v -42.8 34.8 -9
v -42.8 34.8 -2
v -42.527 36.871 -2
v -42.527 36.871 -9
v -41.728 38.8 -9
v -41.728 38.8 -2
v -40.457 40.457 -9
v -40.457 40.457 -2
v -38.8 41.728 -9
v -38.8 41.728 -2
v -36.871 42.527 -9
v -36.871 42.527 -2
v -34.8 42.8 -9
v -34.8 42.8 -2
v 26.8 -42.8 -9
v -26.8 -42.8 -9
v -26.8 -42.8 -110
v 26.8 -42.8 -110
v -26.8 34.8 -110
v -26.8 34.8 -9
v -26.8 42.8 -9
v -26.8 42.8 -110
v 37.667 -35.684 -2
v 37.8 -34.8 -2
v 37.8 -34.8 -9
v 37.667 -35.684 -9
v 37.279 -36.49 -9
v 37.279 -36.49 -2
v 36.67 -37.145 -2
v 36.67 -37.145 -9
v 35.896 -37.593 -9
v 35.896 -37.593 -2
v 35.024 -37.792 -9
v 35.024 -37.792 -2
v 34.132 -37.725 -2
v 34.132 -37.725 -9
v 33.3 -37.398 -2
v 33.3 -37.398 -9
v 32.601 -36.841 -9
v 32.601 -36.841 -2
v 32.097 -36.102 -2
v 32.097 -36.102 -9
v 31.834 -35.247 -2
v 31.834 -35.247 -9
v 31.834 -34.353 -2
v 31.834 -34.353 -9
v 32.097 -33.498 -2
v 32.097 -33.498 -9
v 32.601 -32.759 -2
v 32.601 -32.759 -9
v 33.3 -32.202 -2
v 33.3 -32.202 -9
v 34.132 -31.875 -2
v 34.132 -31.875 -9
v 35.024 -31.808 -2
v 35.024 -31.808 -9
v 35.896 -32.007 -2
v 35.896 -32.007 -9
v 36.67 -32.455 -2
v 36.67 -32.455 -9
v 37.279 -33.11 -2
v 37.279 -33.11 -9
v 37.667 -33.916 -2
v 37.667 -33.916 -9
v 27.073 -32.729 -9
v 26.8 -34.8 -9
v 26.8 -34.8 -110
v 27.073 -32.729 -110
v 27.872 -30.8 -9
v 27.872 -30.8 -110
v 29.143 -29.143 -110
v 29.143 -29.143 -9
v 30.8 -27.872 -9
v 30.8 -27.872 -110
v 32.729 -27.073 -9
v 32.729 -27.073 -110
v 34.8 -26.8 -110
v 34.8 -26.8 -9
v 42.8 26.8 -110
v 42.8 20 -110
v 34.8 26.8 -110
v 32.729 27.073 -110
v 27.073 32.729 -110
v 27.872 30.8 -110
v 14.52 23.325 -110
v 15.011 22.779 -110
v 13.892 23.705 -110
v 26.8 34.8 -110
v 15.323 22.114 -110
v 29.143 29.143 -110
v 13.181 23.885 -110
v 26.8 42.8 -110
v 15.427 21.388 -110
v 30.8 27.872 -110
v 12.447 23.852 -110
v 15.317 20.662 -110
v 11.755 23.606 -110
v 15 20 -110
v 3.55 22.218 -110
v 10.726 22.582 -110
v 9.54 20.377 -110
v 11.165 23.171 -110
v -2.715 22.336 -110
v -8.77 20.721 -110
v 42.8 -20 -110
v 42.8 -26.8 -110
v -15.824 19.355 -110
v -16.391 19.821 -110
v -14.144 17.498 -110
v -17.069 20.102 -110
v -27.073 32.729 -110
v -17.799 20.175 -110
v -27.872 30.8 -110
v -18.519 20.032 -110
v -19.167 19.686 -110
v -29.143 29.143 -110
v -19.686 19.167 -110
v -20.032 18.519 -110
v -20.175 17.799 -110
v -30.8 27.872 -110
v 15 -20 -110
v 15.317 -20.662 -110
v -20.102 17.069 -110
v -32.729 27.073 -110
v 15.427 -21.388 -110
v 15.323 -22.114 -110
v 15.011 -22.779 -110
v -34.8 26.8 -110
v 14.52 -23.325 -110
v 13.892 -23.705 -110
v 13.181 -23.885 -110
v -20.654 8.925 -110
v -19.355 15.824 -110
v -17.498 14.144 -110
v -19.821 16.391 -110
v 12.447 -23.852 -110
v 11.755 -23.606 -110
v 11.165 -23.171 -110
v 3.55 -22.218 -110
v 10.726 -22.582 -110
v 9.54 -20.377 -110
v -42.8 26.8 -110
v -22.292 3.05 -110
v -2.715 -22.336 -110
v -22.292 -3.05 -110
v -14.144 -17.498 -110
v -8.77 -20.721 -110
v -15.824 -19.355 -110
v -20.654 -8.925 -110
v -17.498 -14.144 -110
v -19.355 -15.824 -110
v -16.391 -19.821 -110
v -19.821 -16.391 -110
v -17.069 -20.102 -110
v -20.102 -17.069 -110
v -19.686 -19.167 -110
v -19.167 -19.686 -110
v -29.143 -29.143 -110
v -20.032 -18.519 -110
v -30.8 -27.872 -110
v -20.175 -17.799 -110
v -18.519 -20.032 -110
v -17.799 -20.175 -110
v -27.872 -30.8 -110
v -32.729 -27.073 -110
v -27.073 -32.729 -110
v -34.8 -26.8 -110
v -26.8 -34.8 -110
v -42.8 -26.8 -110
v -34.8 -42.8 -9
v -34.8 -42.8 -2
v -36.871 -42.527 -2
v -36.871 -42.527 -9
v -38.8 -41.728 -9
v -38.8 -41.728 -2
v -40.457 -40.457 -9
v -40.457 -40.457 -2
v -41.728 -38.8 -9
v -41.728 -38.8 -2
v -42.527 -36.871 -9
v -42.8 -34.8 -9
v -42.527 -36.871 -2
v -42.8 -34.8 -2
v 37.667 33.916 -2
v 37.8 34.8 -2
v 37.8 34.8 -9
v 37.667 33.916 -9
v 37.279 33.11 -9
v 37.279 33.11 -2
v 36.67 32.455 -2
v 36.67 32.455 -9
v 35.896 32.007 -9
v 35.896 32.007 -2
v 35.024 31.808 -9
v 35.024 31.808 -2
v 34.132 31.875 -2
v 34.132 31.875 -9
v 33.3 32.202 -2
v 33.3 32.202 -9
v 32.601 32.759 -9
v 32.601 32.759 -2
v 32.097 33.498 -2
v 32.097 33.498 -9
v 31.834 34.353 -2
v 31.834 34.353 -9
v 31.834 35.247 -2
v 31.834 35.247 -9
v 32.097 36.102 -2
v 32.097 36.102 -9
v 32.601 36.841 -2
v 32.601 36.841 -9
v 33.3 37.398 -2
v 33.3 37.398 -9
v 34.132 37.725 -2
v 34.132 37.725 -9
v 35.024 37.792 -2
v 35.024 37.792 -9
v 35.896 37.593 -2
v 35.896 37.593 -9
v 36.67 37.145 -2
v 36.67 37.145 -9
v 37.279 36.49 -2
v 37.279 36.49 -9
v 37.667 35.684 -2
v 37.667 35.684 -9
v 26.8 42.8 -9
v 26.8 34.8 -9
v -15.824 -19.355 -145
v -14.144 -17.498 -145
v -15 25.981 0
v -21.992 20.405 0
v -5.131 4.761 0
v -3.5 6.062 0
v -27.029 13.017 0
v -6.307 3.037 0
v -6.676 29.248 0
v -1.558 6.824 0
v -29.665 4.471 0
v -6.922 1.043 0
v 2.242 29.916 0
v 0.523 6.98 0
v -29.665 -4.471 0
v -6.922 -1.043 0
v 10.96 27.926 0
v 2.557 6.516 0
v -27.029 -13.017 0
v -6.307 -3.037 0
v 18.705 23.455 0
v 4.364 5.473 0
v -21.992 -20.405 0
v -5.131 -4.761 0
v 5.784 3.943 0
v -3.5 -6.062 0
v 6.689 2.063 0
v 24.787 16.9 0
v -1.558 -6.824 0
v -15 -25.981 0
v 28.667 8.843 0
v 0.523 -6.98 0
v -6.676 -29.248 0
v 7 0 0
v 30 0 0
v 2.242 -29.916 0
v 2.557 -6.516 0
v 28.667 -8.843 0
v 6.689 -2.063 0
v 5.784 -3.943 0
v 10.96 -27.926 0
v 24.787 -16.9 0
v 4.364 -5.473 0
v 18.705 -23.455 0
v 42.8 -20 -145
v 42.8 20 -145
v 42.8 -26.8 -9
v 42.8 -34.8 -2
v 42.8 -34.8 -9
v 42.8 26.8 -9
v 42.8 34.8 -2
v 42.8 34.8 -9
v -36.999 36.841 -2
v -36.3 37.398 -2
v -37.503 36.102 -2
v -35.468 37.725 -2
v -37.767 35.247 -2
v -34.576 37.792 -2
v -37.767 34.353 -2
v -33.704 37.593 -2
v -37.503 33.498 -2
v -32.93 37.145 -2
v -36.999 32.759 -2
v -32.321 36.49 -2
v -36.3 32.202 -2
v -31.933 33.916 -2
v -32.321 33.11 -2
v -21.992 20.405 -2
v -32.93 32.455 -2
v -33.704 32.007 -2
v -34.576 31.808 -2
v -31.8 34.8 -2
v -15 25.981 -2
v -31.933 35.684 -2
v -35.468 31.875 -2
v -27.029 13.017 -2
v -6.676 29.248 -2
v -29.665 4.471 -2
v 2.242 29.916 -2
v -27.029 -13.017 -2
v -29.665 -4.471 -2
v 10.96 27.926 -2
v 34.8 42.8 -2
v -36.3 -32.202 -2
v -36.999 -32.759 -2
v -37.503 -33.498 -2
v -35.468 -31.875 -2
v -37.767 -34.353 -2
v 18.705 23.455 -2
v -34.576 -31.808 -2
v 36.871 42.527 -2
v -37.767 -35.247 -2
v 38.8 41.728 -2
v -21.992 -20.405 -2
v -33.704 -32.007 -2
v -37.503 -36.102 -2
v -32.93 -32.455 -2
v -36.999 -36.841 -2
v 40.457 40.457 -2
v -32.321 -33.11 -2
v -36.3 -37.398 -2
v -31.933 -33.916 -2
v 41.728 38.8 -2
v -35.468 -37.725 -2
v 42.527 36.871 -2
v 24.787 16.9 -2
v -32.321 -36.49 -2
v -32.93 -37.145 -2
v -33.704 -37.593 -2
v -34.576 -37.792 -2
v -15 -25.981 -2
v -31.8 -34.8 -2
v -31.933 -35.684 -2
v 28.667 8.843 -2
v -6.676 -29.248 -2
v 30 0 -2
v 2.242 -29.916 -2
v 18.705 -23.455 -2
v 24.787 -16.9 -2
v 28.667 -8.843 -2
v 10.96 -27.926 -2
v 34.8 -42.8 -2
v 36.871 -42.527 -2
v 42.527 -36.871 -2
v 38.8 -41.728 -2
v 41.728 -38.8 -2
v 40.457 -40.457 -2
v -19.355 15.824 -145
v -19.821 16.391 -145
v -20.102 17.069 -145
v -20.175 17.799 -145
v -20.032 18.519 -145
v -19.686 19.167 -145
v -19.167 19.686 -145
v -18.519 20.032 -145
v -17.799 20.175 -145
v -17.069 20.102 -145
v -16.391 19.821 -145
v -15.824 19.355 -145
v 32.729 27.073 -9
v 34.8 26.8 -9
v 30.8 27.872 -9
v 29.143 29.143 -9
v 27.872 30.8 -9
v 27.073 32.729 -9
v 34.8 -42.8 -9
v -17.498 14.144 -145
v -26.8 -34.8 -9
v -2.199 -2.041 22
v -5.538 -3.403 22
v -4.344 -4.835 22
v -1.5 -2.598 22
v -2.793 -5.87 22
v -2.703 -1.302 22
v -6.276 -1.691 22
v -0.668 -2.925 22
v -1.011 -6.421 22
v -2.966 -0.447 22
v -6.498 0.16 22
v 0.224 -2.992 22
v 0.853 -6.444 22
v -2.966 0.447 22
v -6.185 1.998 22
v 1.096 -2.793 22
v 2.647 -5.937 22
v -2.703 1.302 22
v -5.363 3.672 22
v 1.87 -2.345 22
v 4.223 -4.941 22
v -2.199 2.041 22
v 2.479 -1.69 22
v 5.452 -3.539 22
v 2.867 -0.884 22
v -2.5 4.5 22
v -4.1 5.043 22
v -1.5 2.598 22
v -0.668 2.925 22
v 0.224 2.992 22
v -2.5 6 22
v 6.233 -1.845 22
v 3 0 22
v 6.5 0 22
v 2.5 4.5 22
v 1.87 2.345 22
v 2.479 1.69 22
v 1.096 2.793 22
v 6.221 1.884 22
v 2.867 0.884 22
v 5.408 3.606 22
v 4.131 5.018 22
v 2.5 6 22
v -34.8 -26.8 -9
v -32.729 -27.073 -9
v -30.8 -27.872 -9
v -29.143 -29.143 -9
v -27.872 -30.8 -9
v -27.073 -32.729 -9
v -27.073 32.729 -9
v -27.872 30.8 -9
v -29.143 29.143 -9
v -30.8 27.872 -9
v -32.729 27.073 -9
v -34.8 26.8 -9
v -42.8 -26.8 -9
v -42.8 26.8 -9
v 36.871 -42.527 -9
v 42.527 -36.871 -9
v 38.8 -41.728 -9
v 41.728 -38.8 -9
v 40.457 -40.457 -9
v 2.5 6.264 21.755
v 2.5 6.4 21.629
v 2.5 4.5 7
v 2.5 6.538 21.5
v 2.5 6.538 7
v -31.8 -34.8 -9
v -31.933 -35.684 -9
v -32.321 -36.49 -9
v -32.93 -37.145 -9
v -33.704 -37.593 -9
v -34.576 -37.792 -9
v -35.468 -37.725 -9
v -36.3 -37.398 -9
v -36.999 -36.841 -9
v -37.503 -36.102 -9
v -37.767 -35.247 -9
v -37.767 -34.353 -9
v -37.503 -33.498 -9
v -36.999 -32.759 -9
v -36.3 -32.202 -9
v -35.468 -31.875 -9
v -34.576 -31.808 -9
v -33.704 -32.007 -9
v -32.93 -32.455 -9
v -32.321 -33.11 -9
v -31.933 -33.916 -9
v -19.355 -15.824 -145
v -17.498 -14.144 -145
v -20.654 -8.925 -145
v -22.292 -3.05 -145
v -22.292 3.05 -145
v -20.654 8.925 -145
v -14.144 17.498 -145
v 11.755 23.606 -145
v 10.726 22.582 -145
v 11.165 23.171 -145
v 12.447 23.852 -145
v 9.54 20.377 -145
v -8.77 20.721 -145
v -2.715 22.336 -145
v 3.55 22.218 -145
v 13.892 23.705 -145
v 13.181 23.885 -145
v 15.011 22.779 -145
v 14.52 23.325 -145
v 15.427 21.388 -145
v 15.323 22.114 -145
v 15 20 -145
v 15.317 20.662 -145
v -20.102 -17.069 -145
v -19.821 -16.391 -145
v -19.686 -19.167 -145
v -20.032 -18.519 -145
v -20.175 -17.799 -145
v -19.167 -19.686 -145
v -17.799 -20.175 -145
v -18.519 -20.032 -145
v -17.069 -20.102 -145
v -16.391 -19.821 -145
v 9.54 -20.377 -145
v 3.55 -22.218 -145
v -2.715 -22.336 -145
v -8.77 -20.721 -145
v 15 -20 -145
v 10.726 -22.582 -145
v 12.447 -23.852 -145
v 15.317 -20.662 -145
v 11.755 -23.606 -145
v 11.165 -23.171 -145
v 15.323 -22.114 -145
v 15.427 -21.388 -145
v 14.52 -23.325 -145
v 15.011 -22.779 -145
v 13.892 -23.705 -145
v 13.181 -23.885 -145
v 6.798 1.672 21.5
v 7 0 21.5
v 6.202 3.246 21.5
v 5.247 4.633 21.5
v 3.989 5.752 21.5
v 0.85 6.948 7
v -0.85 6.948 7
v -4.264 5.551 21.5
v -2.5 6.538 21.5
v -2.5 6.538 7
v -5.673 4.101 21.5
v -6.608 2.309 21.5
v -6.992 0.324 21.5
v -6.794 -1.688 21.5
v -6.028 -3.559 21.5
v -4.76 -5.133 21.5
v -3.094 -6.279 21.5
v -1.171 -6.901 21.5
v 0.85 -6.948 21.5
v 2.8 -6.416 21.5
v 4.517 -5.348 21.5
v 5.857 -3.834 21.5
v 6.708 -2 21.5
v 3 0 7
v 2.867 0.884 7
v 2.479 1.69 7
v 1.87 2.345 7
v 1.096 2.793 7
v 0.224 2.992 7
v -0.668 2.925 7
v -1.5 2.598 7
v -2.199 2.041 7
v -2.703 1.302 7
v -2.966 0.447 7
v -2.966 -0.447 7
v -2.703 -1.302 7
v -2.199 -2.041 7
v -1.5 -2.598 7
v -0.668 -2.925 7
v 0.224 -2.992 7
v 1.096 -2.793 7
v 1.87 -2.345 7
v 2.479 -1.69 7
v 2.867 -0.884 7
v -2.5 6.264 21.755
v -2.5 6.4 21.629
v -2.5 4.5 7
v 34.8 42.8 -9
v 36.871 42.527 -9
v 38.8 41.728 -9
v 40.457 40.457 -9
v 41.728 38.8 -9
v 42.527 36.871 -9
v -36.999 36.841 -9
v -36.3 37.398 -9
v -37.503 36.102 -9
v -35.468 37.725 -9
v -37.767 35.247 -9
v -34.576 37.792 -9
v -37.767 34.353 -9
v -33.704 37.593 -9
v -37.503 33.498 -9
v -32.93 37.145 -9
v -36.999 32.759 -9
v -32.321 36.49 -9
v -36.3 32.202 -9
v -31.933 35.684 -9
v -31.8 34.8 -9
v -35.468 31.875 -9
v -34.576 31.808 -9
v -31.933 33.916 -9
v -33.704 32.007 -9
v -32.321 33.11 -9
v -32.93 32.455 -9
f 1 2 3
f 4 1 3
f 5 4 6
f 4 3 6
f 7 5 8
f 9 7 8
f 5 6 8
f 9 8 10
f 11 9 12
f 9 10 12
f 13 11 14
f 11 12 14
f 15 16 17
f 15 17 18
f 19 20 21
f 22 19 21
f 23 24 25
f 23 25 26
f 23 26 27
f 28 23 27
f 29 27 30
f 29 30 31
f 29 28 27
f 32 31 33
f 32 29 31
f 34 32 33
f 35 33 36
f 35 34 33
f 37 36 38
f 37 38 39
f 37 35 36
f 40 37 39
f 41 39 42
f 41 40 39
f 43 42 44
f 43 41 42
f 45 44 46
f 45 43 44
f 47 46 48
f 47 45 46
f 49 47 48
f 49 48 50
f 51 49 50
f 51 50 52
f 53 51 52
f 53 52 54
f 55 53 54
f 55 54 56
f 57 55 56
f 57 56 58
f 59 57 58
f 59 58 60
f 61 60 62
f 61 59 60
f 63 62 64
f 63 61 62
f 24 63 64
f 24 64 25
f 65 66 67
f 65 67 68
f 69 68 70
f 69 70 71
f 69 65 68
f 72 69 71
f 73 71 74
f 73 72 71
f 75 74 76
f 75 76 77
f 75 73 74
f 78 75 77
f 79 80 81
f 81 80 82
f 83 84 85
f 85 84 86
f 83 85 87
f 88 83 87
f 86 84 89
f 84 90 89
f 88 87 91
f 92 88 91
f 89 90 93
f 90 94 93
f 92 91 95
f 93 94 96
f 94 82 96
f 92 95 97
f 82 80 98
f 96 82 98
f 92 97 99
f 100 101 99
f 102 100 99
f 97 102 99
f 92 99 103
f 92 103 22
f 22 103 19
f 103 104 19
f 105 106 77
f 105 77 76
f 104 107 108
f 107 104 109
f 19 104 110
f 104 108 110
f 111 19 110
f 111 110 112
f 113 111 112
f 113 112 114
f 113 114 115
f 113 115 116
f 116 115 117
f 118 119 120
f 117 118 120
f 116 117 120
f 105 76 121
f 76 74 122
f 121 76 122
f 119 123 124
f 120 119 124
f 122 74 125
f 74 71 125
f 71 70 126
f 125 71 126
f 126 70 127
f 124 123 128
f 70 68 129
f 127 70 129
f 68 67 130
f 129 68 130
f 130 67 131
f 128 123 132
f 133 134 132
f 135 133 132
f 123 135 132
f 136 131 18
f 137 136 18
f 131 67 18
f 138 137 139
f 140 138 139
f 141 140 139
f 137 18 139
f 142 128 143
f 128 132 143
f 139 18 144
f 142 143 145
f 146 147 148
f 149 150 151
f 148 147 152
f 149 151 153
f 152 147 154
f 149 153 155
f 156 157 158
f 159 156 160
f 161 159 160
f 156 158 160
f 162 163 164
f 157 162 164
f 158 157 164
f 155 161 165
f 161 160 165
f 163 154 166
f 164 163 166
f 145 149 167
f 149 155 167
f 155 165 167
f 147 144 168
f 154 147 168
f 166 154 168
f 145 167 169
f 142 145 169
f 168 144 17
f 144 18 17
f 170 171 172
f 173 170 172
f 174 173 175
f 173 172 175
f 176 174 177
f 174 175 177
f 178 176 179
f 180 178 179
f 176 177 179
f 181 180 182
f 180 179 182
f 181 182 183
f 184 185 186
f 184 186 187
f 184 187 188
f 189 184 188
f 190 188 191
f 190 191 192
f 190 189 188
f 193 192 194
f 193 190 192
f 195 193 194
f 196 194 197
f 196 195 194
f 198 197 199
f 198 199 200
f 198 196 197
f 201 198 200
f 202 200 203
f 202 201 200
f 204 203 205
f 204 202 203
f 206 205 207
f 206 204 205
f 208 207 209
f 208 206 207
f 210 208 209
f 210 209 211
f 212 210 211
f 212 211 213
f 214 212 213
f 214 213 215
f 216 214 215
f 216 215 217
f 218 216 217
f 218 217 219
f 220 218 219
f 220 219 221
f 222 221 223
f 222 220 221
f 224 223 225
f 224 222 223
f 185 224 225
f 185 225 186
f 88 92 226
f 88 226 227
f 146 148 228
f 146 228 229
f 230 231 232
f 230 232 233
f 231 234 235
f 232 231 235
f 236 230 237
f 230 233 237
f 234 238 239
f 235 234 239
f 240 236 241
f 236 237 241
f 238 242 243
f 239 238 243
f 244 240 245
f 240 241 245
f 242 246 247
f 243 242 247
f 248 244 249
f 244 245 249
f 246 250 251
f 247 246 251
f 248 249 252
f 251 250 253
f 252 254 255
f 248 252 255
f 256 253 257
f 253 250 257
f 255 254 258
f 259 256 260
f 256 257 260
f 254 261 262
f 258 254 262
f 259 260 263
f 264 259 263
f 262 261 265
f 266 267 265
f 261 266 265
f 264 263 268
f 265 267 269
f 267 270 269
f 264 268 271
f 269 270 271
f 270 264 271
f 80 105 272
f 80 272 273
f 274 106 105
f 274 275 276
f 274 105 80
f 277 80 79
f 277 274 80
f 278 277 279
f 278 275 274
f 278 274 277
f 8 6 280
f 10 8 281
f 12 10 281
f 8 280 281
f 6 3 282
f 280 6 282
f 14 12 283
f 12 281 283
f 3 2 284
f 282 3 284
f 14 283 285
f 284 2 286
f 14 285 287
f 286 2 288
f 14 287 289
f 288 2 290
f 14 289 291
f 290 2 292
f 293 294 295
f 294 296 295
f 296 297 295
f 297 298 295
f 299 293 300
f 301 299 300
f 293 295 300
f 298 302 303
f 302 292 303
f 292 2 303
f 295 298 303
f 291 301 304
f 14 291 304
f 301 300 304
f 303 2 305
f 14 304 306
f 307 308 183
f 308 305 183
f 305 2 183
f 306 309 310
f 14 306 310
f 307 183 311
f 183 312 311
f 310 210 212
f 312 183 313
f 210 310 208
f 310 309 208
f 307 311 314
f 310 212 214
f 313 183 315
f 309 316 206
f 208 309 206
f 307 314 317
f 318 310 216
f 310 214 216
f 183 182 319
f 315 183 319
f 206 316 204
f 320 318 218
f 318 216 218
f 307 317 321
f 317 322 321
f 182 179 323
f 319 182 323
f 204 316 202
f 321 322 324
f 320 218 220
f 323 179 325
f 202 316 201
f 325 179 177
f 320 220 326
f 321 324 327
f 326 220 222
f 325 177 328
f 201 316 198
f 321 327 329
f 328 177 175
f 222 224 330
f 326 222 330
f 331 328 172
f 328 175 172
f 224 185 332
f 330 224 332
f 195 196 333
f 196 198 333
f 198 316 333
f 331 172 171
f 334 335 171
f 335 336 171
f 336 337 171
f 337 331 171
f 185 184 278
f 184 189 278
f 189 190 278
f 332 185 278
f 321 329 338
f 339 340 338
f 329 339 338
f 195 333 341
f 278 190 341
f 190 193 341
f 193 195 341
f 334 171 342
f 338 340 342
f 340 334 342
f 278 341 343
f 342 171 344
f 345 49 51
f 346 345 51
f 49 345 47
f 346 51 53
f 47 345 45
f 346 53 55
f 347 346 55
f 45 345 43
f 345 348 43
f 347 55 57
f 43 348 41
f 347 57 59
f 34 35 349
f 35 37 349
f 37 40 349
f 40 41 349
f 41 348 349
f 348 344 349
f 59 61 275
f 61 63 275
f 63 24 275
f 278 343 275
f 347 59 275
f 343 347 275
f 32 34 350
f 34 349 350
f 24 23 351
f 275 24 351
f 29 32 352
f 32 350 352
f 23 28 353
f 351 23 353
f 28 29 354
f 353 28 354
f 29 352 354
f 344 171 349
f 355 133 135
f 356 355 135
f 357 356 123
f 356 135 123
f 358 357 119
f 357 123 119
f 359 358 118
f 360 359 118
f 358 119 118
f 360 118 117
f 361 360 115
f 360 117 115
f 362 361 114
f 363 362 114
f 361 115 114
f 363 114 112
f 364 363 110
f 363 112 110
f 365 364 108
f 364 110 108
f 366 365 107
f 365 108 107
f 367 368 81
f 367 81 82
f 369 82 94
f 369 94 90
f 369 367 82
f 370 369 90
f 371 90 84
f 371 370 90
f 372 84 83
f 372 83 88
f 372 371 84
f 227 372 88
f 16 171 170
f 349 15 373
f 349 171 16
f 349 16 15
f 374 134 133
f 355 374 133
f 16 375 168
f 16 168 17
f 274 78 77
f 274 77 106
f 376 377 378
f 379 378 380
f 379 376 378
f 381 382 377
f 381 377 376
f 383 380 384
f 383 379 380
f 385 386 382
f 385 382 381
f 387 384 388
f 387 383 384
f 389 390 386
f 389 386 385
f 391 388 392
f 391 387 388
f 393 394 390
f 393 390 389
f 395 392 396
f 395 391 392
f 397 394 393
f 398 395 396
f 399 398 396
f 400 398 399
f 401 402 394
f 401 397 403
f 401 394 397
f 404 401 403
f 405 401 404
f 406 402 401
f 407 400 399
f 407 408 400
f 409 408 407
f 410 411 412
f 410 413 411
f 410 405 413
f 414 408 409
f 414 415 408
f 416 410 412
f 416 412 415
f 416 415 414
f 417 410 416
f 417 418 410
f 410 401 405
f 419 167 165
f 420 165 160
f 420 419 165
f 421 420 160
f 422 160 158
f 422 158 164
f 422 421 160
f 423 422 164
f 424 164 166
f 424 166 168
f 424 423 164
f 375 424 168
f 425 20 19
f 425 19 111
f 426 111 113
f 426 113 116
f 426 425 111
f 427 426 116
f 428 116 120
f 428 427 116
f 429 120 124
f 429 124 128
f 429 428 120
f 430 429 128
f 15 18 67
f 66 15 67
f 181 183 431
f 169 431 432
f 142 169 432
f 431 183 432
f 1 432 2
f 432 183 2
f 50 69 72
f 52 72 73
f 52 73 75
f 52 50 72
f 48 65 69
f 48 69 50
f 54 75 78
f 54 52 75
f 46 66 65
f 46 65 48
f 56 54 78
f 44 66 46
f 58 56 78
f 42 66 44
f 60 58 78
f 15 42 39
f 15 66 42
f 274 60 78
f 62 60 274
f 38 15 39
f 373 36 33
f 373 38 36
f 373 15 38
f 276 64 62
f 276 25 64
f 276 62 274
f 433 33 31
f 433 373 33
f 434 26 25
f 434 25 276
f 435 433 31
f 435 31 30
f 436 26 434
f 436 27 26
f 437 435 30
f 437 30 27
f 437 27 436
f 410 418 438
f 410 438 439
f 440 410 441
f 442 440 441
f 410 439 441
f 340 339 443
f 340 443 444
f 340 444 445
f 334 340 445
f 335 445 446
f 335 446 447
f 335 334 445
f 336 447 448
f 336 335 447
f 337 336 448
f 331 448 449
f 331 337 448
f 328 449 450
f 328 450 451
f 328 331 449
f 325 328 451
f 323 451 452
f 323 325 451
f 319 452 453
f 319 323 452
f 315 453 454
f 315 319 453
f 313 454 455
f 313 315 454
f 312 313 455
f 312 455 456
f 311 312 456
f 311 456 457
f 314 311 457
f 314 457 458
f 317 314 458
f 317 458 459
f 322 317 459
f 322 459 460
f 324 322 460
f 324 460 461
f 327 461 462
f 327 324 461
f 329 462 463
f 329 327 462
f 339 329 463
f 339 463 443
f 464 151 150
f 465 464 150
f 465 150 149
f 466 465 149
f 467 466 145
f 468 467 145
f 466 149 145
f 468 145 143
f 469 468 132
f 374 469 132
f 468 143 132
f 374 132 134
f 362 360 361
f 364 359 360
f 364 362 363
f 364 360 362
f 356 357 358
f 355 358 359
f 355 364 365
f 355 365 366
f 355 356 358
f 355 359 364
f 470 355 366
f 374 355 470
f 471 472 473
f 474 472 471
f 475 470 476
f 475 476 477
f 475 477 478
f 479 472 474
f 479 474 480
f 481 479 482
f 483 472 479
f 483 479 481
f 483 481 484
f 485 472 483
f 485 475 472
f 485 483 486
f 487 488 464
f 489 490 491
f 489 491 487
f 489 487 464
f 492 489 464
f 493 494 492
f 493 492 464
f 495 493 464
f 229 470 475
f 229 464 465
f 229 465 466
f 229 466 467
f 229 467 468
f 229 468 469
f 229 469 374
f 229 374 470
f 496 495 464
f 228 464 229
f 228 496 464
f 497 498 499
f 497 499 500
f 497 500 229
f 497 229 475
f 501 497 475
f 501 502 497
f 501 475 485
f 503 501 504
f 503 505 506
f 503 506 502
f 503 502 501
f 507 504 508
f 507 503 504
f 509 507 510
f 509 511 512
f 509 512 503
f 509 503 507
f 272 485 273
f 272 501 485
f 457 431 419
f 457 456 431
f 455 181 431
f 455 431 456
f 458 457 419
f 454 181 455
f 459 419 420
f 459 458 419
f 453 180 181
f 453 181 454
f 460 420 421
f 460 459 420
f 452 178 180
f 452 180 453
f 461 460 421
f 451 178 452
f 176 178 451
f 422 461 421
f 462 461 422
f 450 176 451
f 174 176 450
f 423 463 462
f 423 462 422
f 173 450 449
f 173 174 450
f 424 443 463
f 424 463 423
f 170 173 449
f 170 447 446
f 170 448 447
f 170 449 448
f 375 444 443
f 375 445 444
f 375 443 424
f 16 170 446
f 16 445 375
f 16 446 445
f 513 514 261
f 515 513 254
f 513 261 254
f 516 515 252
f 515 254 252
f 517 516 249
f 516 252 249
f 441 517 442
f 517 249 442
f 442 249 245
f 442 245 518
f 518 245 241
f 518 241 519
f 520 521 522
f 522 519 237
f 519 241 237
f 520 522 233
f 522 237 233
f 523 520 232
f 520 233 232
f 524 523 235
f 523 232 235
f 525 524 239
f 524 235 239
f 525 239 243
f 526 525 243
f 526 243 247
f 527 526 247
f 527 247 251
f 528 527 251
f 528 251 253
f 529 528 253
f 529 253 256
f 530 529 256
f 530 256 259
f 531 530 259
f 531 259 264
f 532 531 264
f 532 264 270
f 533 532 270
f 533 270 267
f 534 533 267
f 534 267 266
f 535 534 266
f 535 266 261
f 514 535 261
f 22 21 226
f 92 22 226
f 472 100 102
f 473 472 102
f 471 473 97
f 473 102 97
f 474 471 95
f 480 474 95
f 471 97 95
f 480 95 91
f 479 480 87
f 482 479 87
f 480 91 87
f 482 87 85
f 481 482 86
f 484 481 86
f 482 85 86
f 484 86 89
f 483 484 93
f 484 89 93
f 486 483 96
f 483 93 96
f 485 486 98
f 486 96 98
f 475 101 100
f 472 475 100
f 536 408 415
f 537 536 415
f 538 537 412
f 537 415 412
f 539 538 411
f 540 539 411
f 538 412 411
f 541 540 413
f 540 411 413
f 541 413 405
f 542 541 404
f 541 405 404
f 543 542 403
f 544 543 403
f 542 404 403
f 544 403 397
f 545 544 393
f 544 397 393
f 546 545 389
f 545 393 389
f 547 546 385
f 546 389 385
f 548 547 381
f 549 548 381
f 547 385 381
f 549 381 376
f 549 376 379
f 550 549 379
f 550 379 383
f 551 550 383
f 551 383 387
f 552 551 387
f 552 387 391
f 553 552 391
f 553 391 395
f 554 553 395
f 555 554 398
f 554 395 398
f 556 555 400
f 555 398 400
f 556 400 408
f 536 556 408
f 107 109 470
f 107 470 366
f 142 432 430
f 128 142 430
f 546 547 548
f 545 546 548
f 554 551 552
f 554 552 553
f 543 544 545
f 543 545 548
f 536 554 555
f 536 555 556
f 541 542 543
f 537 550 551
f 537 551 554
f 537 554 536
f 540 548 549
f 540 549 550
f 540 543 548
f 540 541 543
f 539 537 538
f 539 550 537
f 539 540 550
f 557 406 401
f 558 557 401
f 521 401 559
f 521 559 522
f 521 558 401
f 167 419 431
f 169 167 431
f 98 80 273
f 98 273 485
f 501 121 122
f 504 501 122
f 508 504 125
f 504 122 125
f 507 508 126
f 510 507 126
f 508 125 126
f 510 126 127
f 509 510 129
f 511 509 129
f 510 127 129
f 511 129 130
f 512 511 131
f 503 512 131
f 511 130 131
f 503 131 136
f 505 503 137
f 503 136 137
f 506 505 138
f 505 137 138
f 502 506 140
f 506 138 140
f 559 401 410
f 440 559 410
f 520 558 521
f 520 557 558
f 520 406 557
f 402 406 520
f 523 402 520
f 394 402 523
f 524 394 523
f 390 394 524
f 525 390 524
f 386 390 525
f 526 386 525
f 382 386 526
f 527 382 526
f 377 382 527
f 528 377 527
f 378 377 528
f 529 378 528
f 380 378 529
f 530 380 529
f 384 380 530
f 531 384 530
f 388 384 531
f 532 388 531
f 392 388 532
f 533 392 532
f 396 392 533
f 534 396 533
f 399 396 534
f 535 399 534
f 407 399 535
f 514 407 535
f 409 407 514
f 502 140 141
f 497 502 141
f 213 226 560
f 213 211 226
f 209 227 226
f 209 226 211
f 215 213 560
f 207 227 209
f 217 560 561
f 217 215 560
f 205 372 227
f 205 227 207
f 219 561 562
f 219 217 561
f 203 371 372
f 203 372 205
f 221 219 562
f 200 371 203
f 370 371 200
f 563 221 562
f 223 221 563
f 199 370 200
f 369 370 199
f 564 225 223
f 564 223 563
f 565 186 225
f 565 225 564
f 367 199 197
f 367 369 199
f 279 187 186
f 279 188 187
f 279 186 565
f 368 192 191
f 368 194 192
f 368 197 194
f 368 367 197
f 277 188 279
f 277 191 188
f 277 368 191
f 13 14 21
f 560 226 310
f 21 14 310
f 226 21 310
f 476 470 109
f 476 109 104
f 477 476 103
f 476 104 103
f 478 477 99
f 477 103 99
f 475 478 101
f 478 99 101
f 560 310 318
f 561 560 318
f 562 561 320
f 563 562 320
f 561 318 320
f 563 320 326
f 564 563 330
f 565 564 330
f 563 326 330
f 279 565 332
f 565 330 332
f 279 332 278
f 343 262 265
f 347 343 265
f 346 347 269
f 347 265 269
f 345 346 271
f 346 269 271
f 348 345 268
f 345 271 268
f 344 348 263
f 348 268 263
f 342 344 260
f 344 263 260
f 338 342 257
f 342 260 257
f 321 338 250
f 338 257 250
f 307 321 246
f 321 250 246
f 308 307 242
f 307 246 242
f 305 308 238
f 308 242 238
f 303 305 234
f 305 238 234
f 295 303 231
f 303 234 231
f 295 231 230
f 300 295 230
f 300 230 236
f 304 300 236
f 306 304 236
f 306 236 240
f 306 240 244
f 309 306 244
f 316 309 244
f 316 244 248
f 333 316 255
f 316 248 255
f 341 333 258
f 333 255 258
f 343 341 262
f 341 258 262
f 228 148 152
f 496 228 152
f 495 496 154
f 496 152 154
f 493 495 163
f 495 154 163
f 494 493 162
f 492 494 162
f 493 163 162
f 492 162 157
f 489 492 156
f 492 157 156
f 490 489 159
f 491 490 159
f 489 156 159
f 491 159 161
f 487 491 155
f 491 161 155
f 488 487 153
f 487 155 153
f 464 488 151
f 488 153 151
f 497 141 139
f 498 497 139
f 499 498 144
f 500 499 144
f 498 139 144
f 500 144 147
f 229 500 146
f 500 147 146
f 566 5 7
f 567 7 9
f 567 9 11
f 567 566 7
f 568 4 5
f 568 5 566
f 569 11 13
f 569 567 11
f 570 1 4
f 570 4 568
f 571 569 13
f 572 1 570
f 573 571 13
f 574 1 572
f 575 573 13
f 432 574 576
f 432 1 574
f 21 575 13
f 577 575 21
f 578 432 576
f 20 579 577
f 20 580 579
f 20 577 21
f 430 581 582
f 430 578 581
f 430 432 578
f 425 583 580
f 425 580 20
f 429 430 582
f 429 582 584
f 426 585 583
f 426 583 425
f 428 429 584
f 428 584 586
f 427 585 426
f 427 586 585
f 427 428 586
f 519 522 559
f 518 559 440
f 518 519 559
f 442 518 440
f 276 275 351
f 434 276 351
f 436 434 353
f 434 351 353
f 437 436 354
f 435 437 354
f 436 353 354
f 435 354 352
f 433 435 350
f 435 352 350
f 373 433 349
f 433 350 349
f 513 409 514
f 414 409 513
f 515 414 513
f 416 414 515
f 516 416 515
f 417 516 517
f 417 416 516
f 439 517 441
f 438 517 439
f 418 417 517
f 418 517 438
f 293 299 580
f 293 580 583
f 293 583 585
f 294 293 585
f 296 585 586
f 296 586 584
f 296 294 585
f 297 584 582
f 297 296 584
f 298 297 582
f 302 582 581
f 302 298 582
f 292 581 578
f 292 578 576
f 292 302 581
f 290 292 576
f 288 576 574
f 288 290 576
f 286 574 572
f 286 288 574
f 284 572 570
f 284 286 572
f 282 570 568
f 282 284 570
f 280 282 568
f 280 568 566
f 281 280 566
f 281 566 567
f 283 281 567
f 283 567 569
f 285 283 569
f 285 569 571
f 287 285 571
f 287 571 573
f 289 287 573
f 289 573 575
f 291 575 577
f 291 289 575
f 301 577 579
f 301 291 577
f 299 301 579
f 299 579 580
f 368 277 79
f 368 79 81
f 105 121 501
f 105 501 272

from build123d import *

# Parameters (mm, degrees)
SKETCH002_R  = 7
PAD_DEPTH    = 22
SKETCH001_R  = 30
PAD001_DEPTH = 2
SKETCH_R     = 3
PAD002_DEPTH = 7
PAD003_DEPTH = 101
PAD004_DEPTH = 35
SKETCH007_R  = 3
SKETCH007_W  = 5
SKETCH007_H  = 5
POCKET_DEPTH = 15
CHAMFER_SIZE = 0.5


with BuildPart() as part:
    # Sketch002 → Pad (new body)
    with BuildSketch(Plane.XY):
        Circle(SKETCH002_R)
    extrude(amount=PAD_DEPTH)

    # Sketch001 → Pad001 (new body)
    with BuildSketch(Plane(origin=(0, 0, 0), x_dir=(1, 0, 0), z_dir=(0, 0, -1))):
        Circle(SKETCH001_R)
    extrude(amount=PAD001_DEPTH)

    # Sketch → Pad002 (new body)
    with BuildSketch(Plane(origin=(0, 0, -2), x_dir=(1, 0, 0), z_dir=(0, 0, -1))):
        with BuildLine():
            ThreePointArc((-34.800013, 42.799987), (-40.456858, 40.456845), (-42.8, 34.800001))
            Line((-42.8, 34.800001), (-42.8, -34.800026))
            ThreePointArc((-42.8, -34.800026), (-40.456849, -40.456854), (-34.800013, -42.799987))
            Line((-34.800013, -42.799987), (34.800013, -42.799987))
            ThreePointArc((34.800013, -42.799987), (40.456853, -40.45685), (42.8, -34.800013))
            Line((42.8, 34.800013), (42.8, -34.800013))
            ThreePointArc((42.8, 34.800013), (40.456853, 40.45685), (34.800013, 42.799987))
            Line((-34.800013, 42.799987), (34.800013, 42.799987))
        make_face()
        with Locations((-34.800013, 34.8)):
            Circle(SKETCH_R, mode=Mode.SUBTRACT)
        with Locations((34.800013, 34.8)):
            Circle(SKETCH_R, mode=Mode.SUBTRACT)
        with Locations((34.800013, -34.8)):
            Circle(SKETCH_R, mode=Mode.SUBTRACT)
        with Locations((-34.800013, -34.8)):
            Circle(SKETCH_R, mode=Mode.SUBTRACT)
    extrude(amount=PAD002_DEPTH)

    # Sketch003 → Pad003 (new body)
    with BuildSketch(Plane(origin=(0, 0, -9), x_dir=(1, 0, 0), z_dir=(0, 0, -1))):
        with BuildLine():
            ThreePointArc((-34.799995, 26.8), (-29.143142, 29.143149), (-26.8, 34.800005))
            Line((-26.8, 34.800005), (-26.8, 42.8))
            Line((-26.8, 42.8), (26.8, 42.8))
            Line((26.8, 42.8), (26.8, 34.800007))
            ThreePointArc((26.8, 34.800007), (29.143141, 29.14315), (34.799995, 26.8))
            Line((34.799995, 26.8), (42.8, 26.8))
            Line((42.8, 26.8), (42.8, -26.8))
            Line((42.8, -26.8), (34.799993, -26.8))
            ThreePointArc((34.799993, -26.8), (29.143141, -29.143151), (26.8, -34.800007))
            Line((26.8, -42.8), (26.8, -34.800007))
            Line((-26.8, -42.8), (26.8, -42.8))
            Line((-26.8, -34.800007), (-26.8, -42.8))
            ThreePointArc((-26.8, -34.800007), (-29.143141, -29.143151), (-34.799993, -26.8))
            Line((-42.8, -26.8), (-34.799993, -26.8))
            Line((-42.8, 26.8), (-42.8, -26.8))
            Line((-34.799995, 26.8), (-42.8, 26.8))
        make_face()
    extrude(amount=PAD003_DEPTH)

    # Sketch006 → Pad004 (new body)
    with BuildSketch(Plane(origin=(0, 0, -110), x_dir=(1, 0, 0), z_dir=(0, 0, -1))):
        with BuildLine():
            ThreePointArc((15, 20), (14.220252, 23.537936), (10.725728, 22.582266))
            Line((10.725728, 22.582266), (9.539937, 20.377429))
            ThreePointArc((9.539937, 20.377429), (-2.71517, 22.335574), (-14.144211, 17.498322))
            Line((-15.823725, 19.354837), (-14.144211, 17.498322))
            ThreePointArc((-15.823725, 19.354837), (-19.445436, 19.445436), (-19.354837, 15.823725))
            Line((-19.354837, 15.823725), (-17.498325, 14.144208))
            ThreePointArc((-17.498325, 14.144208), (-22.5, -1e-05), (-17.498313, -14.144223))
            Line((-17.498313, -14.144223), (-19.354837, -15.823725))
            ThreePointArc((-19.354837, -15.823725), (-19.445436, -19.445436), (-15.823725, -19.354837))
            Line((-14.144223, -17.498313), (-15.823725, -19.354837))
            ThreePointArc((-14.144223, -17.498313), (-2.715178, -22.335573), (9.539937, -20.377429))
            Line((9.539937, -20.377429), (10.725728, -22.582266))
            ThreePointArc((10.725728, -22.582266), (14.220252, -23.537936), (15, -20))
            Line((42.8, -20), (15, -20))
            Line((42.8, 20), (42.8, -20))
            Line((15, 20), (42.8, 20))
        make_face()
    extrude(amount=PAD004_DEPTH)

    # Sketch007 → Pocket (cut)
    with BuildSketch(Plane.XY.offset(22)):
        Circle(SKETCH007_R)
        with Locations((0, 7)):
            Rectangle(SKETCH007_W, SKETCH007_H)
    extrude(amount=-POCKET_DEPTH, mode=Mode.SUBTRACT)

    # Chamfer
    chamfer_edges = [part.edges().sort_by_distance(p)[0] for p in [
        (-3.968627, -5.766281, 22),
    ]]
    chamfer(chamfer_edges, length=CHAMFER_SIZE)


solid = part.part
